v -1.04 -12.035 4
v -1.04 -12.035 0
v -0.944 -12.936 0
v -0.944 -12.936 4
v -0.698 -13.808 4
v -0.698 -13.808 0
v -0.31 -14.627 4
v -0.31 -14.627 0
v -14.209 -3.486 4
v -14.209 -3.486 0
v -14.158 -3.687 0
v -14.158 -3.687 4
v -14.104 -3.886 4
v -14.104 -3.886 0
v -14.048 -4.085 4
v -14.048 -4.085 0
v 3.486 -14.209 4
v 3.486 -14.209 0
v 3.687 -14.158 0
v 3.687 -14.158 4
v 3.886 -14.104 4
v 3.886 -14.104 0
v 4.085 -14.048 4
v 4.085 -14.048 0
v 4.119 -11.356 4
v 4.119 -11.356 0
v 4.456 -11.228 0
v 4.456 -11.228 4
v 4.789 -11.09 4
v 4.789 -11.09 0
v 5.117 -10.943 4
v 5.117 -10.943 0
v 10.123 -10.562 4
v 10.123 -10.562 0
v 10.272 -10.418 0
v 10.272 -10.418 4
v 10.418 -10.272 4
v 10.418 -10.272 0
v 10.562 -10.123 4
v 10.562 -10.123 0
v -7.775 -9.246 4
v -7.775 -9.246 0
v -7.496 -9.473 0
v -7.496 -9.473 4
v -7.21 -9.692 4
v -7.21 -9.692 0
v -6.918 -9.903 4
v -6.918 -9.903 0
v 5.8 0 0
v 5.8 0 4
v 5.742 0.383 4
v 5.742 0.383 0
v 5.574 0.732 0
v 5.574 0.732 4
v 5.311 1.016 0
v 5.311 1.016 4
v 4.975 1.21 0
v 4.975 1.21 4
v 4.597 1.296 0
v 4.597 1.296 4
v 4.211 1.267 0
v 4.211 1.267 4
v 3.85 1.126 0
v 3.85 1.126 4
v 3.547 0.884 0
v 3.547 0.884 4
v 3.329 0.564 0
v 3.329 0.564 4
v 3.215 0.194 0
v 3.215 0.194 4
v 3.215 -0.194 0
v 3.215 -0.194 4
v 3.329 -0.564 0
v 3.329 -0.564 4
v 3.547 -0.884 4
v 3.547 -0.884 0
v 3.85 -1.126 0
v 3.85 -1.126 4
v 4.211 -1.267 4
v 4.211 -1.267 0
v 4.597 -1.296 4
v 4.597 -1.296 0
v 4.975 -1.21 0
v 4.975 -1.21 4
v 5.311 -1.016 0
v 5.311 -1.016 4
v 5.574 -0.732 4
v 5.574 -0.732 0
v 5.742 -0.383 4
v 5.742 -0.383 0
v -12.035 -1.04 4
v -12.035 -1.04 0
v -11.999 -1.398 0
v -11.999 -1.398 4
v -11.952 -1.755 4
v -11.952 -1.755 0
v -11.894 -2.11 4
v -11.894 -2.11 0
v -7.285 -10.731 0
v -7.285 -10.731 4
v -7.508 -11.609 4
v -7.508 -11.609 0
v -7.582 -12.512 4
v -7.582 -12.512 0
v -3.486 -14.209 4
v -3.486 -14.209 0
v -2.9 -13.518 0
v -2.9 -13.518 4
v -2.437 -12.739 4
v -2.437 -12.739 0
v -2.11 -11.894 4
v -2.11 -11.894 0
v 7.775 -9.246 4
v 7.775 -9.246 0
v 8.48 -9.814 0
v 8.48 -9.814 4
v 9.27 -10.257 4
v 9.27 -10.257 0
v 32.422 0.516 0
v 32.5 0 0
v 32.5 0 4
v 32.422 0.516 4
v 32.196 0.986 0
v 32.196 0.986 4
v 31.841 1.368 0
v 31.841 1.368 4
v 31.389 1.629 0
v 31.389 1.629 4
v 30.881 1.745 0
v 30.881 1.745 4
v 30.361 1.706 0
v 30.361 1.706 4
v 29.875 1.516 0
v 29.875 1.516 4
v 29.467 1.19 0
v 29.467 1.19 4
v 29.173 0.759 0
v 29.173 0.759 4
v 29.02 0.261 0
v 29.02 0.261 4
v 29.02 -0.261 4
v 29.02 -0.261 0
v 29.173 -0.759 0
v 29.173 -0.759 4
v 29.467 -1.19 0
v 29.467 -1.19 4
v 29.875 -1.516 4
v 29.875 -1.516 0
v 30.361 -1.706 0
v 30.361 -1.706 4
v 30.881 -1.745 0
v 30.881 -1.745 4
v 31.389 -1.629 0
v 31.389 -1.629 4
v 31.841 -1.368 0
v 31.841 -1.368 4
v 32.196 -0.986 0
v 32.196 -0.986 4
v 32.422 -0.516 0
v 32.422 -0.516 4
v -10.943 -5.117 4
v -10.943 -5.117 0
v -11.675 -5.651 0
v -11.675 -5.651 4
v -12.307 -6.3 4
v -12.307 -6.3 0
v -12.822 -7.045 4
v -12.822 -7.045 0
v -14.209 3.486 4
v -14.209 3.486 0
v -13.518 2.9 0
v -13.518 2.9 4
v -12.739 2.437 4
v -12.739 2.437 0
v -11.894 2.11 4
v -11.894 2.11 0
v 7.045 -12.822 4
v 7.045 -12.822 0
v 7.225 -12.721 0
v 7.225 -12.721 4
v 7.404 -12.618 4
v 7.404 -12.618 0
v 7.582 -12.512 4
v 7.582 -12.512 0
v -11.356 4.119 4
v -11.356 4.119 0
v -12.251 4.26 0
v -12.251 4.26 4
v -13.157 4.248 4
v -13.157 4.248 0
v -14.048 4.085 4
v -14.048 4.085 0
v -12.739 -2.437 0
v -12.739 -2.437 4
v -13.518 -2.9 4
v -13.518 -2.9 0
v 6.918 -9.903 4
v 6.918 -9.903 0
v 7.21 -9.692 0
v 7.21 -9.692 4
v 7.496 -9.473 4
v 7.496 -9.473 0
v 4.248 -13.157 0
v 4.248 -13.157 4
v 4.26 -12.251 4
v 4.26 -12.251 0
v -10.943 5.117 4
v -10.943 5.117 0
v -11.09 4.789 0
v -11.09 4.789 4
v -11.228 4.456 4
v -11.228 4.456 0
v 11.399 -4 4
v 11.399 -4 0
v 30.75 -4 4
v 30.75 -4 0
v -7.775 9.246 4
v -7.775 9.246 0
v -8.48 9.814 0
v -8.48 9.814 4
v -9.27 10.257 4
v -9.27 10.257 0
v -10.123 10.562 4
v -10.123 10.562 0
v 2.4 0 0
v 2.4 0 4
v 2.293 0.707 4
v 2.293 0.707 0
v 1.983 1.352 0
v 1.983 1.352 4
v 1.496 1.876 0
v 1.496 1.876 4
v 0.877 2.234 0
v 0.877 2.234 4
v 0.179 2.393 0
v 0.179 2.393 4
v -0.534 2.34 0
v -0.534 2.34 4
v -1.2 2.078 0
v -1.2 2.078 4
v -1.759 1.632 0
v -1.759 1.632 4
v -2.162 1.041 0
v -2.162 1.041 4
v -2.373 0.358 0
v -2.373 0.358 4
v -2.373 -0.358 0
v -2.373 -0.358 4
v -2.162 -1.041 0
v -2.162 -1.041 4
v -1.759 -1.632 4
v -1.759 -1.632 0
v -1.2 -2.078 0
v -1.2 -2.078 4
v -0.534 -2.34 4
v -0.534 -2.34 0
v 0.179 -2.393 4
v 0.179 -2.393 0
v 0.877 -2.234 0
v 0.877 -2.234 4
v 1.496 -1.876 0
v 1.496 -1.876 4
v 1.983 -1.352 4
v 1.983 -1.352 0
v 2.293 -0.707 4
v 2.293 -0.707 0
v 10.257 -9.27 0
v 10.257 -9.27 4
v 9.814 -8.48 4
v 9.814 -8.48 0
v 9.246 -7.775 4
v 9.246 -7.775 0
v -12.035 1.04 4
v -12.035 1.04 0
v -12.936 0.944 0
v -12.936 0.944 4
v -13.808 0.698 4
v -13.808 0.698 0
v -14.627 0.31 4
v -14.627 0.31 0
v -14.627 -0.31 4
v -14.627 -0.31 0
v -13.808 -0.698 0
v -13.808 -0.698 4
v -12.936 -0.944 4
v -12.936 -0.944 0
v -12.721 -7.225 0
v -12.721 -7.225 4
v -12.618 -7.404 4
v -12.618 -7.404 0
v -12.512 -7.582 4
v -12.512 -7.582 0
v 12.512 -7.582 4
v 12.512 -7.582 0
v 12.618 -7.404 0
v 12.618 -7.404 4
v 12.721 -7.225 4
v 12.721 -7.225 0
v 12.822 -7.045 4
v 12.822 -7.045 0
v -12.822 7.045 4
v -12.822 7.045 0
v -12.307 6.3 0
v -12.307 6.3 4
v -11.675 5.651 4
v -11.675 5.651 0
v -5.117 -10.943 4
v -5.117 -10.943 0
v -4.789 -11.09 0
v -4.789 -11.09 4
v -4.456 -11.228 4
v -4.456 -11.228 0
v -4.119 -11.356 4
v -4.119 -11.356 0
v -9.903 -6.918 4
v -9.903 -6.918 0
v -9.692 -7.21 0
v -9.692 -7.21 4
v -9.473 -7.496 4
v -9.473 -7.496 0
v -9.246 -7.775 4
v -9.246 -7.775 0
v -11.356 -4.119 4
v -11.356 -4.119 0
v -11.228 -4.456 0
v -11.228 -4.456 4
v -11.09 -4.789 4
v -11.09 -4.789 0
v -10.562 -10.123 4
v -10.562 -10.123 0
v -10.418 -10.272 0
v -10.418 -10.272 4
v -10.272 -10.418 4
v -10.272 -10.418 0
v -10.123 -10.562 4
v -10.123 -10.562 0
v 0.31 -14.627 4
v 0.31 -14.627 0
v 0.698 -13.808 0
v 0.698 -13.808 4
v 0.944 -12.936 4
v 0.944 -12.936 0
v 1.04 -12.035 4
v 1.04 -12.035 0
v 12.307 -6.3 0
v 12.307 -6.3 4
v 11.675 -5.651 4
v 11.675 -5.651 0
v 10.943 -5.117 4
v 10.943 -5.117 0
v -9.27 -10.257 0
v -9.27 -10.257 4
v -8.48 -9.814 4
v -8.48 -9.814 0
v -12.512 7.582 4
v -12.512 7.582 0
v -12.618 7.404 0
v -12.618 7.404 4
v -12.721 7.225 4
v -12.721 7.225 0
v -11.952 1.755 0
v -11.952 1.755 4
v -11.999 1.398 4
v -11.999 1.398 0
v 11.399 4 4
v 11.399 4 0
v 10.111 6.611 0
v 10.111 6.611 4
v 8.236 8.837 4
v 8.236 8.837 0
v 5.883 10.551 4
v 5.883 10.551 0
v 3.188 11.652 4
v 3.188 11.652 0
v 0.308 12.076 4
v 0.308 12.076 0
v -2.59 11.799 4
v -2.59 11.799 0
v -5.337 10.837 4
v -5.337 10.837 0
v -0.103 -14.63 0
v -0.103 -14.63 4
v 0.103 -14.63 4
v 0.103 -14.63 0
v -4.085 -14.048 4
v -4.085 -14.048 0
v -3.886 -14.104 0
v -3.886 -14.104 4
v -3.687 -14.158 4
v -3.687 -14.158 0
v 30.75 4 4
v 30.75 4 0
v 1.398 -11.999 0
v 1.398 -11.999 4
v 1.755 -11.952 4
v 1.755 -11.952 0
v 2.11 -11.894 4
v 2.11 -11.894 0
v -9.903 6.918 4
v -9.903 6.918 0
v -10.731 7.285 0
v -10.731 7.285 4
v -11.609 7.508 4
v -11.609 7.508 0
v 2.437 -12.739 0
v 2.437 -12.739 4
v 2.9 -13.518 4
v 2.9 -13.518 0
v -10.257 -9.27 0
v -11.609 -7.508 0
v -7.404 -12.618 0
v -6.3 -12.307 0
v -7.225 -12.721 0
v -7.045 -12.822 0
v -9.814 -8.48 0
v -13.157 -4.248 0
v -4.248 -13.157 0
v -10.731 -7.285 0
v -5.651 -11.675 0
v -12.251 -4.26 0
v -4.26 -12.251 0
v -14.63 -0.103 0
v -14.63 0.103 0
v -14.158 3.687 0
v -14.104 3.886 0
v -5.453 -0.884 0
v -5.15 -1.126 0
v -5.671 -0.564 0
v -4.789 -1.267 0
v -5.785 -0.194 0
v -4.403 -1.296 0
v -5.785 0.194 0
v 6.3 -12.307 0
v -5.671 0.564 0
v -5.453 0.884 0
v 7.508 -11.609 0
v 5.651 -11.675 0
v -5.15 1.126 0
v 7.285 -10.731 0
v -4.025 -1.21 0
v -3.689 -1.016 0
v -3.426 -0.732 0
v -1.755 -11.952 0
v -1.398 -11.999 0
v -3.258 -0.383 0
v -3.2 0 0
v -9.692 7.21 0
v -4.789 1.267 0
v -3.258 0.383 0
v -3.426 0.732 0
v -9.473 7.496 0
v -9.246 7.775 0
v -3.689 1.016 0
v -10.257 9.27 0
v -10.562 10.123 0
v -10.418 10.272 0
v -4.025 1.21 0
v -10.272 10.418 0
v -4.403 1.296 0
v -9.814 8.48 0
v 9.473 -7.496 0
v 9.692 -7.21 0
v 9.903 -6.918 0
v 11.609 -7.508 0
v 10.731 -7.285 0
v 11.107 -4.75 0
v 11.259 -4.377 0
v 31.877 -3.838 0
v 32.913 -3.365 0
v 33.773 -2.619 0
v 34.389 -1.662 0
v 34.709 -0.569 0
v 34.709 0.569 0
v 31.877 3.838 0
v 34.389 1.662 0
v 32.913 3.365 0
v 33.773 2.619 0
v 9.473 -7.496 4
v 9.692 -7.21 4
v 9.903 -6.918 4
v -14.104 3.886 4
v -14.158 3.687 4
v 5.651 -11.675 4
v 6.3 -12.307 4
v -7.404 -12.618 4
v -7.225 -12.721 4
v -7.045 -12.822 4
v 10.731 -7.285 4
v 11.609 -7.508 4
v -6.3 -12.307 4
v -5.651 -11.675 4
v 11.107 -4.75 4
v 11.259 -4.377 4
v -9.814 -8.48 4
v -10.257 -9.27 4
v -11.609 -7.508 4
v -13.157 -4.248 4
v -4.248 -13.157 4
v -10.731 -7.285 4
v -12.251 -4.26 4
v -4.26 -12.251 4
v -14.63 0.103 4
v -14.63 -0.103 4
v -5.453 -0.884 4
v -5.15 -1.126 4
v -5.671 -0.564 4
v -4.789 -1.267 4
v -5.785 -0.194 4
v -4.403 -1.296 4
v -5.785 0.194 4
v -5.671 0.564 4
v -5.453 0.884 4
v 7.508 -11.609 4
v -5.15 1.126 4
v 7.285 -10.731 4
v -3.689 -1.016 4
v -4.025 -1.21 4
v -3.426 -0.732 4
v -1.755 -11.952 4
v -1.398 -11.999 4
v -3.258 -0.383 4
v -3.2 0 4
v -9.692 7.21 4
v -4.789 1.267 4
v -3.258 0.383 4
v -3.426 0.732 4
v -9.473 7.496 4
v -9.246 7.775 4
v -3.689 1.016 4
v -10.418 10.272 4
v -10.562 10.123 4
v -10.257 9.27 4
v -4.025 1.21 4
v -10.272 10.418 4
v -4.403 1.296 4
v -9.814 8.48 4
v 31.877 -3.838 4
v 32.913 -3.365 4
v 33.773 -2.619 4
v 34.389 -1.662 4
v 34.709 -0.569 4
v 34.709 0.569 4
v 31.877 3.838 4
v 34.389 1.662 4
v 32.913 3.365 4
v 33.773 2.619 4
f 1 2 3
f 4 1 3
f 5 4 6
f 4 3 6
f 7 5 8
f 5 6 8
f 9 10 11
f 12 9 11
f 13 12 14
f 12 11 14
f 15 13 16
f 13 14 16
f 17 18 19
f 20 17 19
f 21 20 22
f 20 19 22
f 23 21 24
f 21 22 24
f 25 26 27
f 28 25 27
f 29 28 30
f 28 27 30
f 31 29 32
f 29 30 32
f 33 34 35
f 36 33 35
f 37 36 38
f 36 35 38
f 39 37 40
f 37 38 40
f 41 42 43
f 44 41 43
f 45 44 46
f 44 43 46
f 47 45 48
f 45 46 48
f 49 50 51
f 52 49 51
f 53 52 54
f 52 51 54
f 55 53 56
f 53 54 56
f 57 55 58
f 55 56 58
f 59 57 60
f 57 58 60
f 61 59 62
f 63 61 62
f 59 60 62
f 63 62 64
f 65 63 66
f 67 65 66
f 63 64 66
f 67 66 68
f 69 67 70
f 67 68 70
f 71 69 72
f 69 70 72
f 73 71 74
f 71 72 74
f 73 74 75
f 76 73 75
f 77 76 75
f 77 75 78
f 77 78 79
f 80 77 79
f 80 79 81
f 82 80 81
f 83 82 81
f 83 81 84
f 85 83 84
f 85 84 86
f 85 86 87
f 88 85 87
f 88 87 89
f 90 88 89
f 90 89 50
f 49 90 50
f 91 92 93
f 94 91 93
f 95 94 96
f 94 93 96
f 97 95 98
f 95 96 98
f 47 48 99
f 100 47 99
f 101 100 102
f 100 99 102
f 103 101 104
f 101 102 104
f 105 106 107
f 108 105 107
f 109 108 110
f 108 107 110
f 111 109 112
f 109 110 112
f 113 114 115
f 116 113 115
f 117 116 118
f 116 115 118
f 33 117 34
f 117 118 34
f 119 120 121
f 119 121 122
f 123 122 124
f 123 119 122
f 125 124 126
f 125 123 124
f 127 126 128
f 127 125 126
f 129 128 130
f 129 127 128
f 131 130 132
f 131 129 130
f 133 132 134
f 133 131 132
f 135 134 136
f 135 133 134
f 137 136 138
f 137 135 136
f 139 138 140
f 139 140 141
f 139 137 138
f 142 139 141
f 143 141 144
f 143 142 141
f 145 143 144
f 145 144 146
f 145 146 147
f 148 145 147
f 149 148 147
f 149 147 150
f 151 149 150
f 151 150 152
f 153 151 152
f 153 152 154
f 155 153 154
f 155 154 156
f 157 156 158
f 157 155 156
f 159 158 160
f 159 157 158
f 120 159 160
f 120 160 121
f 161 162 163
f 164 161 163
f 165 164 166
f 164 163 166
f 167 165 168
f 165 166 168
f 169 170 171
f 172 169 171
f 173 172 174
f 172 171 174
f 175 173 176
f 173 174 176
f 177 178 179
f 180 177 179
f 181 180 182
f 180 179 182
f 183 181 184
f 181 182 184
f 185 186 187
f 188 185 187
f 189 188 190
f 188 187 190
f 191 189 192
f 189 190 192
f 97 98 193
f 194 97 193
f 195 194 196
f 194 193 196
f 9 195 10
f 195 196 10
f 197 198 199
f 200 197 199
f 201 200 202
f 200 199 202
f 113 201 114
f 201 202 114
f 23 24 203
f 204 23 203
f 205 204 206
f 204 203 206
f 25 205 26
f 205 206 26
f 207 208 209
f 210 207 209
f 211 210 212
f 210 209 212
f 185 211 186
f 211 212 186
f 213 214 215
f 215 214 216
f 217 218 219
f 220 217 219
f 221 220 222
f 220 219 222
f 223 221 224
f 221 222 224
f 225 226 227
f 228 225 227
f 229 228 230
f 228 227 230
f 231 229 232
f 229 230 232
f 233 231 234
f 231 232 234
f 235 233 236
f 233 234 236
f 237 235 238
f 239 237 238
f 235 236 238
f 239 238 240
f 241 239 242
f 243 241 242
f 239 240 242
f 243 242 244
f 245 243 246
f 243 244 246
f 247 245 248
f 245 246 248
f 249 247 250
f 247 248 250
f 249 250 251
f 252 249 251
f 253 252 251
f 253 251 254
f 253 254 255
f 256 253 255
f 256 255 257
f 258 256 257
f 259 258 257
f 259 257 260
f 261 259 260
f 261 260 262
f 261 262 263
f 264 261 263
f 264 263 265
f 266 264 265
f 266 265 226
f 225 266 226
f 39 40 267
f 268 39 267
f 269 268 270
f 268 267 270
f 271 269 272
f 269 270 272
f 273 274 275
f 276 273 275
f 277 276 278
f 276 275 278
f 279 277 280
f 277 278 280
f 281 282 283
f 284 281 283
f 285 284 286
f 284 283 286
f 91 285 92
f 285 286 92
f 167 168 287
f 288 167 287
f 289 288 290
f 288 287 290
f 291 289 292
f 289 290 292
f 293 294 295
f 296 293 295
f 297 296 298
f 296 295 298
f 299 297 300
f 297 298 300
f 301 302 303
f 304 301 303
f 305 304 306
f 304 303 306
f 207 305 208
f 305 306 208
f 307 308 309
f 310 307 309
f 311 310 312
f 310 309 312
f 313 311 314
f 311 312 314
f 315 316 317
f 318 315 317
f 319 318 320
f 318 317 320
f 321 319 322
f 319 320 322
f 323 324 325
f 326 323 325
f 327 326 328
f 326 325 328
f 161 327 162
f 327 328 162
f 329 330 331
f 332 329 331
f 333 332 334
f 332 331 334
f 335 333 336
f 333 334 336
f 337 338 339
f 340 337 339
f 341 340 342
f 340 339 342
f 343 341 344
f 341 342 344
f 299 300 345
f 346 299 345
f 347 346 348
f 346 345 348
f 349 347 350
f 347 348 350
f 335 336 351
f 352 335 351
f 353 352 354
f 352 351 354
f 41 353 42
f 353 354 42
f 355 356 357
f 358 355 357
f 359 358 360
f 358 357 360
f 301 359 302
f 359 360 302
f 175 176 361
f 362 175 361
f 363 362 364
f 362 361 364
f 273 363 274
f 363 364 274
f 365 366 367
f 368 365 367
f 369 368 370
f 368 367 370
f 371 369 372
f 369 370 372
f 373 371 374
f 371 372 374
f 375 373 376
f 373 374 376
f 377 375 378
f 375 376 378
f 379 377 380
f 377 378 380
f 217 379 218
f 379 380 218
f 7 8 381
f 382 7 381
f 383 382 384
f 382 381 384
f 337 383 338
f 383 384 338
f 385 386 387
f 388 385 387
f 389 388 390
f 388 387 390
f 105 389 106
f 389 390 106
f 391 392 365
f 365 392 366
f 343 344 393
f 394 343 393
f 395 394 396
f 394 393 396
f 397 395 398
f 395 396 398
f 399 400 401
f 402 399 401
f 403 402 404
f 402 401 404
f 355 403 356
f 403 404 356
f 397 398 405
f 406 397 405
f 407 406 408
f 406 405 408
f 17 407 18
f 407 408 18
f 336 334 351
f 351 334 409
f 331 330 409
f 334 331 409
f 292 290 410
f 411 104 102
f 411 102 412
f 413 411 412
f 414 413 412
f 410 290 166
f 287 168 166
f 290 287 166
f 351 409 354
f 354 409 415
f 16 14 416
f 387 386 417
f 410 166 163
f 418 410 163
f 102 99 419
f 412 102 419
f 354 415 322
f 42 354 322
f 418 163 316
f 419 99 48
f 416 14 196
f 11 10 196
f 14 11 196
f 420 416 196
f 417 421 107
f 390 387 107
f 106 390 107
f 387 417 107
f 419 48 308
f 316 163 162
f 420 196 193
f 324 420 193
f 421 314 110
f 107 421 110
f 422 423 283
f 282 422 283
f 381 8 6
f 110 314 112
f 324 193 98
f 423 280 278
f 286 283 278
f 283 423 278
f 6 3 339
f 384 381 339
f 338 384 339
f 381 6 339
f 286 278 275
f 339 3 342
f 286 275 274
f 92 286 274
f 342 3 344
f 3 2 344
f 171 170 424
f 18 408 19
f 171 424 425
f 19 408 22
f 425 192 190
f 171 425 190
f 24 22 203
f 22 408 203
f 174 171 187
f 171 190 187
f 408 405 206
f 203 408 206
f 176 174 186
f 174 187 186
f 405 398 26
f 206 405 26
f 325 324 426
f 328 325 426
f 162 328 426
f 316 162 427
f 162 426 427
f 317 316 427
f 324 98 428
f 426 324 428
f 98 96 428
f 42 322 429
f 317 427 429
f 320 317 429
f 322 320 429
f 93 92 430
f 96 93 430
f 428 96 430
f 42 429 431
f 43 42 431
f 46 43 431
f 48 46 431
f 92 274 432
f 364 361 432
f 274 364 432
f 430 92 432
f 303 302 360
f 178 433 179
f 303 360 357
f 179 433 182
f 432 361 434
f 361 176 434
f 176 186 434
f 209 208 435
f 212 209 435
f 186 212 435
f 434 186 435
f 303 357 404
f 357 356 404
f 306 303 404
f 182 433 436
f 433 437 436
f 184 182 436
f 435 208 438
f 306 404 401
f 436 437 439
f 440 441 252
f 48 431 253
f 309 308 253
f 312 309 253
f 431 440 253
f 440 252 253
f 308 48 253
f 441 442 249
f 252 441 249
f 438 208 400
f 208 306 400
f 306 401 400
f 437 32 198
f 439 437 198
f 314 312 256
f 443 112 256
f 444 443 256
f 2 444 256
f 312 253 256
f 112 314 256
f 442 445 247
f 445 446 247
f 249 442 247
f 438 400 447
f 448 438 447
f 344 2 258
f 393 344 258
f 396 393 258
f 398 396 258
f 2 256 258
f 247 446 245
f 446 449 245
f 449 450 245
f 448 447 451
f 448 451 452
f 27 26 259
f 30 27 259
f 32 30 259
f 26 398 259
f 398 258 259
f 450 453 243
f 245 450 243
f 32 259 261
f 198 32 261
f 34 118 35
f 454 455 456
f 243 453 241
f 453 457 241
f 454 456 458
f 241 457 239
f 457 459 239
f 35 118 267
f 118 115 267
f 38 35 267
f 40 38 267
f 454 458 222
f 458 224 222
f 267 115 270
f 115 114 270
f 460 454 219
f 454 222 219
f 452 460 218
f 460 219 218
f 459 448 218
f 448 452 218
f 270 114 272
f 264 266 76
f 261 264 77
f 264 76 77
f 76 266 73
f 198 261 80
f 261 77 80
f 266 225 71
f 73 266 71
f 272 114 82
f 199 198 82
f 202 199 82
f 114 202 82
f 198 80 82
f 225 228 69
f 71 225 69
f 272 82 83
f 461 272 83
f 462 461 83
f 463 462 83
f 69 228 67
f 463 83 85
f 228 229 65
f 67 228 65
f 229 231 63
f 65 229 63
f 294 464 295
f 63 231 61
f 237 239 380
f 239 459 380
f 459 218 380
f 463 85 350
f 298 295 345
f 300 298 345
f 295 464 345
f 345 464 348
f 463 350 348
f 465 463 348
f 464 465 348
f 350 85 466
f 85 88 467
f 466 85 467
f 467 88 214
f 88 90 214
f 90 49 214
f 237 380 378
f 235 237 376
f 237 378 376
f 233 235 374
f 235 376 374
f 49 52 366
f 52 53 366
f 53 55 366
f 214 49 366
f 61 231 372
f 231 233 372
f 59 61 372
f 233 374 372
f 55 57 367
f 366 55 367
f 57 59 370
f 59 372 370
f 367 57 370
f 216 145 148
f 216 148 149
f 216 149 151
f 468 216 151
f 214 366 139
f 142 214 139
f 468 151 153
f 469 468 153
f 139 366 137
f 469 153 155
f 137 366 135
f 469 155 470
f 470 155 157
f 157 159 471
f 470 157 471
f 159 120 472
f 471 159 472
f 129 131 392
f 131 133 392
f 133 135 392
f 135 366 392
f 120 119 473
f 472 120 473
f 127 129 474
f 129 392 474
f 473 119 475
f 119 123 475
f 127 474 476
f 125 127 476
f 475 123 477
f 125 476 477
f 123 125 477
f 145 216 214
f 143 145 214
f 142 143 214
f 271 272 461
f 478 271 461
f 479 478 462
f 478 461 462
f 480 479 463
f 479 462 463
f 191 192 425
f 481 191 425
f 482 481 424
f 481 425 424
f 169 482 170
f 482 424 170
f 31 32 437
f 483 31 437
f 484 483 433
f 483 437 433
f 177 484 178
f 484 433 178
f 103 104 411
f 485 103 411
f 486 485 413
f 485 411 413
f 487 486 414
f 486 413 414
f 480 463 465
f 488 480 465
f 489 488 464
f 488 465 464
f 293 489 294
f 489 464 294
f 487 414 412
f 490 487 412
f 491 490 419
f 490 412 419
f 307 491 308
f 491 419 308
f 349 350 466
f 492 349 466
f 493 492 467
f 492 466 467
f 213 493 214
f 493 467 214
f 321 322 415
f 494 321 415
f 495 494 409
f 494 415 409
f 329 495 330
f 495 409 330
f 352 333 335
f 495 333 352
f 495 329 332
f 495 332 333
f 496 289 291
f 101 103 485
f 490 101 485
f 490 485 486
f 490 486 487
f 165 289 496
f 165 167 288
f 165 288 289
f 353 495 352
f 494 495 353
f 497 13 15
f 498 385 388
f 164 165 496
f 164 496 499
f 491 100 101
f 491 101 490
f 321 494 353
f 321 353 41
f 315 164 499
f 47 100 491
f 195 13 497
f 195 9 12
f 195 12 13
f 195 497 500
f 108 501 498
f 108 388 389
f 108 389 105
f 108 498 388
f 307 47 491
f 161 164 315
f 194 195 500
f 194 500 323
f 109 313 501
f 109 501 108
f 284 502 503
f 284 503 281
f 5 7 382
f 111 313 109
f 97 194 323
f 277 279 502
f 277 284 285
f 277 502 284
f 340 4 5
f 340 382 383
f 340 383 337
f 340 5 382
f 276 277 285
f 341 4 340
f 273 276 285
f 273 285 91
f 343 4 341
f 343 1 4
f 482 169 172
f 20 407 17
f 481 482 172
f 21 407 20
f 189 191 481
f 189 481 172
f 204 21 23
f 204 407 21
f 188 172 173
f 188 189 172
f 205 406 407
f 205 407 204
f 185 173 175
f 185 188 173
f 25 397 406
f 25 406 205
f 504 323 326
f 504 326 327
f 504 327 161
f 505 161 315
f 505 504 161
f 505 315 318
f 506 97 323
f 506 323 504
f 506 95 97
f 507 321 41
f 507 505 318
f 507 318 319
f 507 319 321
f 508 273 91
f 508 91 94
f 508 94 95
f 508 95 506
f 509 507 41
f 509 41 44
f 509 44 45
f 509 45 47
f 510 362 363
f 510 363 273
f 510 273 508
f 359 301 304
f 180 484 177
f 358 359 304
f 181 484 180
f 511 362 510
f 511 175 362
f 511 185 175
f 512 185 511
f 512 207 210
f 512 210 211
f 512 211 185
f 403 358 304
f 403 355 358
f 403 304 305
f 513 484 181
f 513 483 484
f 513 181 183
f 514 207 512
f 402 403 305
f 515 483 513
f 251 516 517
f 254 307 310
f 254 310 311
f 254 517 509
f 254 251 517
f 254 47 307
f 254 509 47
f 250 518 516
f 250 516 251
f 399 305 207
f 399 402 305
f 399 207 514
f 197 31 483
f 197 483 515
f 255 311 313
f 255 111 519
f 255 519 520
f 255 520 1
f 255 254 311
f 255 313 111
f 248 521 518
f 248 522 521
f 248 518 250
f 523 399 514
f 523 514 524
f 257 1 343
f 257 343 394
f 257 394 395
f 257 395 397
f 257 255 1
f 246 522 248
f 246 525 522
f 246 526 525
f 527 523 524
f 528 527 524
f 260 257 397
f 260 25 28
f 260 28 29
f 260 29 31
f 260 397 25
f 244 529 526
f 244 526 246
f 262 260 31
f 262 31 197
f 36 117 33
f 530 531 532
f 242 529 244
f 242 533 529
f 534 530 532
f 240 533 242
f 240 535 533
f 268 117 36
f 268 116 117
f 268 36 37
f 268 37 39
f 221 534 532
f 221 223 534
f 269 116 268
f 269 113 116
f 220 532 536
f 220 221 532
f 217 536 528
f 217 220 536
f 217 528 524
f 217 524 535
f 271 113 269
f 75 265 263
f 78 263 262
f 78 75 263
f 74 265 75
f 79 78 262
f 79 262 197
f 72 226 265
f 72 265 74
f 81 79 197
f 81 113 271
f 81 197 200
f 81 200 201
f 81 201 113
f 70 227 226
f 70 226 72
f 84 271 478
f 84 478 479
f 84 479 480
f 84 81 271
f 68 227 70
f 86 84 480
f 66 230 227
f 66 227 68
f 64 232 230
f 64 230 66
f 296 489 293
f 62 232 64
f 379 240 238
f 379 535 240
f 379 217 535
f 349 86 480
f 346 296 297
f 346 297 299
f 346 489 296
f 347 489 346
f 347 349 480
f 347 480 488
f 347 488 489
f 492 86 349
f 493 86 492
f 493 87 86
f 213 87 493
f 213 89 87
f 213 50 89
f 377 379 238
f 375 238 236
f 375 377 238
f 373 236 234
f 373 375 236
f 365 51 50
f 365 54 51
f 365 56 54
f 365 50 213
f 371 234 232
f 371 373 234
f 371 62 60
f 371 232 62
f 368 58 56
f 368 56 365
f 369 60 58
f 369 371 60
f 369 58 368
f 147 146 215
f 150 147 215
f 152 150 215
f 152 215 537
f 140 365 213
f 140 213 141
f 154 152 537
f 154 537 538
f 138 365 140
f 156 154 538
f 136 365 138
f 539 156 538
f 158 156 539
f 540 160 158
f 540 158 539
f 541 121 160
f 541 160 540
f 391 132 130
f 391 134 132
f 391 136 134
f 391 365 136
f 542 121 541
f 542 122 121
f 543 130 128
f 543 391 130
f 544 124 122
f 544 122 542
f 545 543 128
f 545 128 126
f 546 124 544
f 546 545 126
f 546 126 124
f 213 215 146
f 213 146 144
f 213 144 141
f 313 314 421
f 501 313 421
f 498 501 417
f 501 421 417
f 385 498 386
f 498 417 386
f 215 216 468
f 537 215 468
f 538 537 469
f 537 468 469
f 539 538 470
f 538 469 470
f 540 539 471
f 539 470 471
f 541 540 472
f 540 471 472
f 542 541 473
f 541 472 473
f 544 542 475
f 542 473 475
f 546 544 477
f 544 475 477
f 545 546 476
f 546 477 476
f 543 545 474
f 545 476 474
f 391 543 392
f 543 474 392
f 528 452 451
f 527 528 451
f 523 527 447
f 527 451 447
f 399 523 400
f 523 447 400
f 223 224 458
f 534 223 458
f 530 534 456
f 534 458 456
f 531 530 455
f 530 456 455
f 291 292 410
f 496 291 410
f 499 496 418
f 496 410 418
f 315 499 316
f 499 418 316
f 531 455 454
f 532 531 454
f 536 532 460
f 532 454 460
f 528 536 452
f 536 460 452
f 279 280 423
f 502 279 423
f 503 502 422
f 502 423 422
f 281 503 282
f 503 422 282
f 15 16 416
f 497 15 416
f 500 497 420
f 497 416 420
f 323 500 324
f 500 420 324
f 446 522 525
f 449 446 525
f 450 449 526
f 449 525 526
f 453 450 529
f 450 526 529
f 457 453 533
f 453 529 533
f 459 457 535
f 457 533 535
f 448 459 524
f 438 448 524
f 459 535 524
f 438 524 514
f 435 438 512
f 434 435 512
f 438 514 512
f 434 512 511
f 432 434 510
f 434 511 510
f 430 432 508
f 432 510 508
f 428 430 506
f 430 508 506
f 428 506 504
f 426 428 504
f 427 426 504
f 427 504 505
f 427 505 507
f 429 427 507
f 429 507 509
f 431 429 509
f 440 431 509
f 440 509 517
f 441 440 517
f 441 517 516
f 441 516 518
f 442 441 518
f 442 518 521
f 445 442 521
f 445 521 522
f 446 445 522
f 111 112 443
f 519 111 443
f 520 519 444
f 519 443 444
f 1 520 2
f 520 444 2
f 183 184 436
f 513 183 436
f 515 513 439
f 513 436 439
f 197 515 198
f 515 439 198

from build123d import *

# Parameters (mm, degrees)
SKETCH1_R           = 1.75
BOSS_EXTRUDE3_DEPTH = 4
SKETCH3_R           = 1.3
SKETCH3_R_2         = 2.4
CUT_EXTRUDE1_DEPTH  = 38.915688046


with BuildPart() as part:
    # Sketch1 → Boss-Extrude3 (new body)
    with BuildSketch(Plane.XY):
        with BuildLine():
            ThreePointArc((11.398526221, 4), (3.187763399, 11.651805204), (-7.774744082, 9.245526186))
            ThreePointArc((-7.774744082, 9.245526186), (-8.865739978, 10.052419077), (-10.123446462, 10.561852666))
            ThreePointArc((-10.123446462, 10.561852666), (-10.344972209, 10.344972209), (-10.561852666, 10.123446462))
            ThreePointArc((-10.561852666, 10.123446462), (-10.052419077, 8.865739978), (-9.245526186, 7.774744082))
            ThreePointArc((-9.245526186, 7.774744082), (-9.583708351, 7.353838062), (-9.90274436, 6.918240682))
            ThreePointArc((-9.90274436, 6.918240682), (-11.16540472, 7.415268848), (-12.51210701, 7.581825517))
            ThreePointArc((-12.51210701, 7.581825517), (-12.669951657, 7.315), (-12.82210701, 7.044889767))
            ThreePointArc((-12.82210701, 7.044889767), (-12.004513558, 5.961889707), (-10.94274436, 5.116907842))
            ThreePointArc((-10.94274436, 5.116907842), (-11.160464753, 4.622815863), (-11.355888976, 4.119488508))
            ThreePointArc((-11.355888976, 4.119488508), (-12.704165582, 4.272780301), (-14.048088143, 4.085109489))
            ThreePointArc((-14.048088143, 4.085109489), (-14.131494839, 3.78652263), (-14.208555951, 3.486235477))
            ThreePointArc((-14.208555951, 3.486235477), (-13.138520279, 2.651746506), (-11.89423259, 2.110362789))
            ThreePointArc((-11.89423259, 2.110362789), (-11.976653925, 1.576756402), (-12.035148524, 1.04))
            ThreePointArc((-12.035148524, 1.04), (-13.377158555, 0.839108838), (-14.626715284, 0.31))
            ThreePointArc((-14.626715284, 0.31), (-14.63, 0), (-14.626715284, -0.31))
            ThreePointArc((-14.626715284, -0.31), (-13.377158555, -0.839108838), (-12.035148524, -1.04))
            ThreePointArc((-12.035148524, -1.04), (-11.976653925, -1.576756402), (-11.89423259, -2.110362789))
            ThreePointArc((-11.89423259, -2.110362789), (-13.138520279, -2.651746506), (-14.208555951, -3.486235477))
            ThreePointArc((-14.208555951, -3.486235477), (-14.131494839, -3.78652263), (-14.048088143, -4.085109489))
            ThreePointArc((-14.048088143, -4.085109489), (-12.704165582, -4.272780301), (-11.355888976, -4.119488508))
            ThreePointArc((-11.355888976, -4.119488508), (-11.160464753, -4.622815863), (-10.94274436, -5.116907842))
            ThreePointArc((-10.94274436, -5.116907842), (-12.004513558, -5.961889707), (-12.82210701, -7.044889767))
            ThreePointArc((-12.82210701, -7.044889767), (-12.669951657, -7.315), (-12.51210701, -7.581825517))
            ThreePointArc((-12.51210701, -7.581825517), (-11.16540472, -7.415268848), (-9.90274436, -6.918240682))
            ThreePointArc((-9.90274436, -6.918240682), (-9.583708351, -7.353838062), (-9.245526186, -7.774744082))
            ThreePointArc((-9.245526186, -7.774744082), (-10.052419077, -8.865739978), (-10.561852666, -10.123446462))
            ThreePointArc((-10.561852666, -10.123446462), (-10.344972209, -10.344972209), (-10.123446462, -10.561852666))
            ThreePointArc((-10.123446462, -10.561852666), (-8.865739978, -10.052419077), (-7.774744082, -9.245526186))
            ThreePointArc((-7.774744082, -9.245526186), (-7.353838062, -9.583708351), (-6.918240682, -9.90274436))
            ThreePointArc((-6.918240682, -9.90274436), (-7.415268848, -11.16540472), (-7.581825517, -12.51210701))
            ThreePointArc((-7.581825517, -12.51210701), (-7.315, -12.669951657), (-7.044889767, -12.82210701))
            ThreePointArc((-7.044889767, -12.82210701), (-5.961889707, -12.004513558), (-5.116907842, -10.94274436))
            ThreePointArc((-5.116907842, -10.94274436), (-4.622815863, -11.160464753), (-4.119488508, -11.355888976))
            ThreePointArc((-4.119488508, -11.355888976), (-4.272780301, -12.704165582), (-4.085109489, -14.048088143))
            ThreePointArc((-4.085109489, -14.048088143), (-3.78652263, -14.131494839), (-3.486235477, -14.208555951))
            ThreePointArc((-3.486235477, -14.208555951), (-2.651746506, -13.138520279), (-2.110362789, -11.89423259))
            ThreePointArc((-2.110362789, -11.89423259), (-1.576756402, -11.976653925), (-1.04, -12.035148524))
            ThreePointArc((-1.04, -12.035148524), (-0.839108838, -13.377158555), (-0.31, -14.626715284))
            ThreePointArc((-0.31, -14.626715284), (0, -14.63), (0.31, -14.626715284))
            ThreePointArc((0.31, -14.626715284), (0.839108838, -13.377158555), (1.04, -12.035148524))
            ThreePointArc((1.04, -12.035148524), (1.576756402, -11.976653925), (2.110362789, -11.89423259))
            ThreePointArc((2.110362789, -11.89423259), (2.651746506, -13.138520279), (3.486235477, -14.208555951))
            ThreePointArc((3.486235477, -14.208555951), (3.78652263, -14.131494839), (4.085109489, -14.048088143))
            ThreePointArc((4.085109489, -14.048088143), (4.272780301, -12.704165582), (4.119488508, -11.355888976))
            ThreePointArc((4.119488508, -11.355888976), (4.622815863, -11.160464753), (5.116907842, -10.94274436))
            ThreePointArc((5.116907842, -10.94274436), (5.961889707, -12.004513558), (7.044889767, -12.82210701))
            ThreePointArc((7.044889767, -12.82210701), (7.315, -12.669951657), (7.581825517, -12.51210701))
            ThreePointArc((7.581825517, -12.51210701), (7.415268848, -11.16540472), (6.918240682, -9.90274436))
            ThreePointArc((6.918240682, -9.90274436), (7.353838062, -9.583708351), (7.774744082, -9.245526186))
            ThreePointArc((7.774744082, -9.245526186), (8.865739978, -10.052419077), (10.123446462, -10.561852666))
            ThreePointArc((10.123446462, -10.561852666), (10.344972209, -10.344972209), (10.561852666, -10.123446462))
            ThreePointArc((10.561852666, -10.123446462), (10.052419077, -8.865739978), (9.245526186, -7.774744082))
            ThreePointArc((9.245526186, -7.774744082), (9.583708351, -7.353838062), (9.90274436, -6.918240682))
            ThreePointArc((9.90274436, -6.918240682), (11.16540472, -7.415268848), (12.51210701, -7.581825517))
            ThreePointArc((12.51210701, -7.581825517), (12.669951657, -7.315), (12.82210701, -7.044889767))
            ThreePointArc((12.82210701, -7.044889767), (12.004513558, -5.961889707), (10.94274436, -5.116907842))
            ThreePointArc((10.94274436, -5.116907842), (11.184585981, -4.564146845), (11.398526221, -4))
            Line((11.398526221, -4), (30.75, -4))
            ThreePointArc((30.75, -4), (34.75, 0), (30.75, 4))
            Line((30.75, 4), (11.398526221, 4))
        make_face()
        Circle(SKETCH1_R, mode=Mode.SUBTRACT)
        with Locations((30.75, 0)):
            Circle(SKETCH1_R, mode=Mode.SUBTRACT)
    extrude(amount=BOSS_EXTRUDE3_DEPTH)

    # Sketch3 → Cut-Extrude1 (cut, through all)
    with BuildSketch(Plane.XY.offset(4)):
        with Locations((4.5, 0)):
            Circle(SKETCH3_R)
        with Locations((-4.5, 0)):
            Circle(SKETCH3_R)
        Circle(SKETCH3_R_2)
    extrude(amount=-CUT_EXTRUDE1_DEPTH, mode=Mode.SUBTRACT)


solid = part.part
